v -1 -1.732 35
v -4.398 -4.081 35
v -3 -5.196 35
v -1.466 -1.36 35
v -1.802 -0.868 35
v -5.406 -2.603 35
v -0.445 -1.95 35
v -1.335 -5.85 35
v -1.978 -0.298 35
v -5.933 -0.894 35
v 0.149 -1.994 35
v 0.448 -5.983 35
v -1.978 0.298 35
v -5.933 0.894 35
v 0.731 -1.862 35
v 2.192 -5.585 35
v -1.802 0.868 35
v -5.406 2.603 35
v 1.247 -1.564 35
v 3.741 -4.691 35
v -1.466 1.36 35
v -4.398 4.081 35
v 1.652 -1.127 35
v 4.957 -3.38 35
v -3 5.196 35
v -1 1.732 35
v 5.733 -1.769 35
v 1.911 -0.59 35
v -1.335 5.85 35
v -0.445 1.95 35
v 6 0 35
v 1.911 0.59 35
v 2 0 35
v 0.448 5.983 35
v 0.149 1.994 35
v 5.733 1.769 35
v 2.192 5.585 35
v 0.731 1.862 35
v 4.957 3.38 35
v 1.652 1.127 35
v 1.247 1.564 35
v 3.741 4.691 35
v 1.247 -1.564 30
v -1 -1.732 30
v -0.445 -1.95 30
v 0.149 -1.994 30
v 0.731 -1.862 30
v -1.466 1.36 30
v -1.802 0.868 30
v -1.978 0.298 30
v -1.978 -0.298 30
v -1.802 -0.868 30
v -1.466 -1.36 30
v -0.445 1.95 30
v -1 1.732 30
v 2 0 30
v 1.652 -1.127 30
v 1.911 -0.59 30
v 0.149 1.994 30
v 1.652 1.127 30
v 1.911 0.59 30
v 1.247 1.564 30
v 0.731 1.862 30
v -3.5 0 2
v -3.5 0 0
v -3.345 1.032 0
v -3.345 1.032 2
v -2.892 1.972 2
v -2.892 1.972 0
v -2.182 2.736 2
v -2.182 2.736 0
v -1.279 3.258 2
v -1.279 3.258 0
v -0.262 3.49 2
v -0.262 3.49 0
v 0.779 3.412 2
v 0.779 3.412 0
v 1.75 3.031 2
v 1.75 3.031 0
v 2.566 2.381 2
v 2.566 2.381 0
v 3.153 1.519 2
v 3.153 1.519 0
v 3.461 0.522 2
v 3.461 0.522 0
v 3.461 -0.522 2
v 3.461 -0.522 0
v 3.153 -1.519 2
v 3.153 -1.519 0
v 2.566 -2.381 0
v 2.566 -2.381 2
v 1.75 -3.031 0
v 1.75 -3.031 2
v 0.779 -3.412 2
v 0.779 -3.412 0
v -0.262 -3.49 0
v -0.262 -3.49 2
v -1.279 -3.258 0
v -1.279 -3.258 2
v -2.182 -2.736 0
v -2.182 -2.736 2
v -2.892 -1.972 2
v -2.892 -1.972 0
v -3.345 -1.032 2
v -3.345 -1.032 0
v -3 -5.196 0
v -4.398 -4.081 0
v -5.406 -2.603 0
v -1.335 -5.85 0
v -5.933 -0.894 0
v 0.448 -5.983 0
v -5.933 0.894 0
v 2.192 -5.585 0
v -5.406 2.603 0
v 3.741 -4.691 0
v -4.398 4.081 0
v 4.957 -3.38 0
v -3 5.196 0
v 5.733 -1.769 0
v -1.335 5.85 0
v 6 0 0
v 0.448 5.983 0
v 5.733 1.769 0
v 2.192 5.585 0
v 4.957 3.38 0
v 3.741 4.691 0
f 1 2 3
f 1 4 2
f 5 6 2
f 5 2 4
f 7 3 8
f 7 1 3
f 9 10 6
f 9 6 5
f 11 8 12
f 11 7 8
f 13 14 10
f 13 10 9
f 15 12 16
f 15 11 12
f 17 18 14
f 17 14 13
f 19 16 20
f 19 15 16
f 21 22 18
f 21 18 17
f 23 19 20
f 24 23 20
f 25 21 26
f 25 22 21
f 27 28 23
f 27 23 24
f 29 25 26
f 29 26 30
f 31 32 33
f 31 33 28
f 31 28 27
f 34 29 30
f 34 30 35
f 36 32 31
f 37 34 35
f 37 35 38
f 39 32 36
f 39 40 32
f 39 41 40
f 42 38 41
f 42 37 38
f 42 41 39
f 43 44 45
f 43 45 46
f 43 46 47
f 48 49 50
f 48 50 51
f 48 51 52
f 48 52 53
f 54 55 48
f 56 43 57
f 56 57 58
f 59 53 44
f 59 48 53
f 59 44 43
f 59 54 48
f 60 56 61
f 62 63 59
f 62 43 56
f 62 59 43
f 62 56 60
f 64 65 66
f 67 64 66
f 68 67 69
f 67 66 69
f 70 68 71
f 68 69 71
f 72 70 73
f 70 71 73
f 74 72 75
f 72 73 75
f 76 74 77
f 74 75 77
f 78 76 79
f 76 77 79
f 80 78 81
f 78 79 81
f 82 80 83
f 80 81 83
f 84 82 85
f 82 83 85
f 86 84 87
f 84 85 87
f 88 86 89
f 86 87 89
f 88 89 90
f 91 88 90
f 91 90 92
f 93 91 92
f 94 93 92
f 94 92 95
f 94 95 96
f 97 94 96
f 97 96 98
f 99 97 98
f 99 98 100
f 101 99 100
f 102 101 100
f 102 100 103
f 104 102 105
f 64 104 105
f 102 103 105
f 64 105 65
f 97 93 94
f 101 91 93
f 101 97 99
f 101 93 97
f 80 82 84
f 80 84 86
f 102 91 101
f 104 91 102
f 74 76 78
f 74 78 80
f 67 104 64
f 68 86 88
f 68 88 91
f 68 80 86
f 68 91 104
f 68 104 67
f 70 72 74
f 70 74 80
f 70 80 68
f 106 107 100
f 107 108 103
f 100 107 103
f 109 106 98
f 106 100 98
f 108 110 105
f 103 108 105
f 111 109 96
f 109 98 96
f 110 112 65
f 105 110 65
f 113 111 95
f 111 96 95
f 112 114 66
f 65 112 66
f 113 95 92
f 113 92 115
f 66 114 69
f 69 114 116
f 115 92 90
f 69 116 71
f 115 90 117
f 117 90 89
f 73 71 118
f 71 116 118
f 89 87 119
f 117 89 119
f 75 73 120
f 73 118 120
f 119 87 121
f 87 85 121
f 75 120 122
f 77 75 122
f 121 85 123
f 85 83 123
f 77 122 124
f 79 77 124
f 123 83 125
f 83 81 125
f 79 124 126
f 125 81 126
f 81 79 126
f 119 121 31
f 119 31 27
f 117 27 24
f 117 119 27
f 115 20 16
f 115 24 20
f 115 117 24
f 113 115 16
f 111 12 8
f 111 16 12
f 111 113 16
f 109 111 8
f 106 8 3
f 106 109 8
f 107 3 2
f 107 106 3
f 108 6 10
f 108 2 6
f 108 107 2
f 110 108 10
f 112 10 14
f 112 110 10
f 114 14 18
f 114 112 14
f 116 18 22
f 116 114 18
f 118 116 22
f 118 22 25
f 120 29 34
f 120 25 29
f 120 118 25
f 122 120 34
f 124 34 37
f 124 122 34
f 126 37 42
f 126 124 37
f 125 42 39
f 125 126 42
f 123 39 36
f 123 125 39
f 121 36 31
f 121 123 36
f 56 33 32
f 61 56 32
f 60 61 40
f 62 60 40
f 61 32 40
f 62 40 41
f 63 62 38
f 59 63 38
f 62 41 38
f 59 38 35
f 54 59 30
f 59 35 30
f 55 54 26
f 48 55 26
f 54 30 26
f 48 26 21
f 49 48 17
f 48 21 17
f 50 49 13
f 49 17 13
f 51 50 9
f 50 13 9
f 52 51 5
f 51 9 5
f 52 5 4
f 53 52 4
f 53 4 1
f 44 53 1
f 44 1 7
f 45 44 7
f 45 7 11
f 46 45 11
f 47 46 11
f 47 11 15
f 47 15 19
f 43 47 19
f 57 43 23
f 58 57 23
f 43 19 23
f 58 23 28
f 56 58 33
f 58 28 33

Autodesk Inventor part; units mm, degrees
ref_plane "YZ Plane" through (0, 0, 0) normal (1, 0, 0) x (0, 1, 0)
ref_plane "XZ Plane" through (0, 0, 0) normal (0, 1, 0) x (-1, 0, 0)
ref_plane "XY Plane" through (0, 0, 0) normal (0, 0, 1) x (1, 0, 0)
sketch "Sketch1" plane through (0, 0, 0) normal (0, 0, 1) x (1, 0, 0)
  circle A0 centre (0, 0) radius 6
  dimension "d0" = 12
extrude "Extrusion1" add sketch "Sketch1" along normal blind 35
sketch "Sketch2" plane through (0, 0, 35) normal (0, 0, 1) x (1, 0, 0)
  circle A0 centre (0, 0) radius 2
  circle A1 centre (0, 0) radius 6 projected
  dimension "d3" = 4
extrude "Extrusion2" cut sketch "Sketch2" against normal blind 5 contours A0
sketch "Sketch3" plane through (0, 0, 0) normal (0, 0, -1) x (-1, 0, 0)
  circle A0 centre (0, 0) radius 3.5
  dimension "d6" = 7
extrude "Extrusion3" cut sketch "Sketch3" against normal blind 2
properties part number "Laser" material "Aluminum 6061"
